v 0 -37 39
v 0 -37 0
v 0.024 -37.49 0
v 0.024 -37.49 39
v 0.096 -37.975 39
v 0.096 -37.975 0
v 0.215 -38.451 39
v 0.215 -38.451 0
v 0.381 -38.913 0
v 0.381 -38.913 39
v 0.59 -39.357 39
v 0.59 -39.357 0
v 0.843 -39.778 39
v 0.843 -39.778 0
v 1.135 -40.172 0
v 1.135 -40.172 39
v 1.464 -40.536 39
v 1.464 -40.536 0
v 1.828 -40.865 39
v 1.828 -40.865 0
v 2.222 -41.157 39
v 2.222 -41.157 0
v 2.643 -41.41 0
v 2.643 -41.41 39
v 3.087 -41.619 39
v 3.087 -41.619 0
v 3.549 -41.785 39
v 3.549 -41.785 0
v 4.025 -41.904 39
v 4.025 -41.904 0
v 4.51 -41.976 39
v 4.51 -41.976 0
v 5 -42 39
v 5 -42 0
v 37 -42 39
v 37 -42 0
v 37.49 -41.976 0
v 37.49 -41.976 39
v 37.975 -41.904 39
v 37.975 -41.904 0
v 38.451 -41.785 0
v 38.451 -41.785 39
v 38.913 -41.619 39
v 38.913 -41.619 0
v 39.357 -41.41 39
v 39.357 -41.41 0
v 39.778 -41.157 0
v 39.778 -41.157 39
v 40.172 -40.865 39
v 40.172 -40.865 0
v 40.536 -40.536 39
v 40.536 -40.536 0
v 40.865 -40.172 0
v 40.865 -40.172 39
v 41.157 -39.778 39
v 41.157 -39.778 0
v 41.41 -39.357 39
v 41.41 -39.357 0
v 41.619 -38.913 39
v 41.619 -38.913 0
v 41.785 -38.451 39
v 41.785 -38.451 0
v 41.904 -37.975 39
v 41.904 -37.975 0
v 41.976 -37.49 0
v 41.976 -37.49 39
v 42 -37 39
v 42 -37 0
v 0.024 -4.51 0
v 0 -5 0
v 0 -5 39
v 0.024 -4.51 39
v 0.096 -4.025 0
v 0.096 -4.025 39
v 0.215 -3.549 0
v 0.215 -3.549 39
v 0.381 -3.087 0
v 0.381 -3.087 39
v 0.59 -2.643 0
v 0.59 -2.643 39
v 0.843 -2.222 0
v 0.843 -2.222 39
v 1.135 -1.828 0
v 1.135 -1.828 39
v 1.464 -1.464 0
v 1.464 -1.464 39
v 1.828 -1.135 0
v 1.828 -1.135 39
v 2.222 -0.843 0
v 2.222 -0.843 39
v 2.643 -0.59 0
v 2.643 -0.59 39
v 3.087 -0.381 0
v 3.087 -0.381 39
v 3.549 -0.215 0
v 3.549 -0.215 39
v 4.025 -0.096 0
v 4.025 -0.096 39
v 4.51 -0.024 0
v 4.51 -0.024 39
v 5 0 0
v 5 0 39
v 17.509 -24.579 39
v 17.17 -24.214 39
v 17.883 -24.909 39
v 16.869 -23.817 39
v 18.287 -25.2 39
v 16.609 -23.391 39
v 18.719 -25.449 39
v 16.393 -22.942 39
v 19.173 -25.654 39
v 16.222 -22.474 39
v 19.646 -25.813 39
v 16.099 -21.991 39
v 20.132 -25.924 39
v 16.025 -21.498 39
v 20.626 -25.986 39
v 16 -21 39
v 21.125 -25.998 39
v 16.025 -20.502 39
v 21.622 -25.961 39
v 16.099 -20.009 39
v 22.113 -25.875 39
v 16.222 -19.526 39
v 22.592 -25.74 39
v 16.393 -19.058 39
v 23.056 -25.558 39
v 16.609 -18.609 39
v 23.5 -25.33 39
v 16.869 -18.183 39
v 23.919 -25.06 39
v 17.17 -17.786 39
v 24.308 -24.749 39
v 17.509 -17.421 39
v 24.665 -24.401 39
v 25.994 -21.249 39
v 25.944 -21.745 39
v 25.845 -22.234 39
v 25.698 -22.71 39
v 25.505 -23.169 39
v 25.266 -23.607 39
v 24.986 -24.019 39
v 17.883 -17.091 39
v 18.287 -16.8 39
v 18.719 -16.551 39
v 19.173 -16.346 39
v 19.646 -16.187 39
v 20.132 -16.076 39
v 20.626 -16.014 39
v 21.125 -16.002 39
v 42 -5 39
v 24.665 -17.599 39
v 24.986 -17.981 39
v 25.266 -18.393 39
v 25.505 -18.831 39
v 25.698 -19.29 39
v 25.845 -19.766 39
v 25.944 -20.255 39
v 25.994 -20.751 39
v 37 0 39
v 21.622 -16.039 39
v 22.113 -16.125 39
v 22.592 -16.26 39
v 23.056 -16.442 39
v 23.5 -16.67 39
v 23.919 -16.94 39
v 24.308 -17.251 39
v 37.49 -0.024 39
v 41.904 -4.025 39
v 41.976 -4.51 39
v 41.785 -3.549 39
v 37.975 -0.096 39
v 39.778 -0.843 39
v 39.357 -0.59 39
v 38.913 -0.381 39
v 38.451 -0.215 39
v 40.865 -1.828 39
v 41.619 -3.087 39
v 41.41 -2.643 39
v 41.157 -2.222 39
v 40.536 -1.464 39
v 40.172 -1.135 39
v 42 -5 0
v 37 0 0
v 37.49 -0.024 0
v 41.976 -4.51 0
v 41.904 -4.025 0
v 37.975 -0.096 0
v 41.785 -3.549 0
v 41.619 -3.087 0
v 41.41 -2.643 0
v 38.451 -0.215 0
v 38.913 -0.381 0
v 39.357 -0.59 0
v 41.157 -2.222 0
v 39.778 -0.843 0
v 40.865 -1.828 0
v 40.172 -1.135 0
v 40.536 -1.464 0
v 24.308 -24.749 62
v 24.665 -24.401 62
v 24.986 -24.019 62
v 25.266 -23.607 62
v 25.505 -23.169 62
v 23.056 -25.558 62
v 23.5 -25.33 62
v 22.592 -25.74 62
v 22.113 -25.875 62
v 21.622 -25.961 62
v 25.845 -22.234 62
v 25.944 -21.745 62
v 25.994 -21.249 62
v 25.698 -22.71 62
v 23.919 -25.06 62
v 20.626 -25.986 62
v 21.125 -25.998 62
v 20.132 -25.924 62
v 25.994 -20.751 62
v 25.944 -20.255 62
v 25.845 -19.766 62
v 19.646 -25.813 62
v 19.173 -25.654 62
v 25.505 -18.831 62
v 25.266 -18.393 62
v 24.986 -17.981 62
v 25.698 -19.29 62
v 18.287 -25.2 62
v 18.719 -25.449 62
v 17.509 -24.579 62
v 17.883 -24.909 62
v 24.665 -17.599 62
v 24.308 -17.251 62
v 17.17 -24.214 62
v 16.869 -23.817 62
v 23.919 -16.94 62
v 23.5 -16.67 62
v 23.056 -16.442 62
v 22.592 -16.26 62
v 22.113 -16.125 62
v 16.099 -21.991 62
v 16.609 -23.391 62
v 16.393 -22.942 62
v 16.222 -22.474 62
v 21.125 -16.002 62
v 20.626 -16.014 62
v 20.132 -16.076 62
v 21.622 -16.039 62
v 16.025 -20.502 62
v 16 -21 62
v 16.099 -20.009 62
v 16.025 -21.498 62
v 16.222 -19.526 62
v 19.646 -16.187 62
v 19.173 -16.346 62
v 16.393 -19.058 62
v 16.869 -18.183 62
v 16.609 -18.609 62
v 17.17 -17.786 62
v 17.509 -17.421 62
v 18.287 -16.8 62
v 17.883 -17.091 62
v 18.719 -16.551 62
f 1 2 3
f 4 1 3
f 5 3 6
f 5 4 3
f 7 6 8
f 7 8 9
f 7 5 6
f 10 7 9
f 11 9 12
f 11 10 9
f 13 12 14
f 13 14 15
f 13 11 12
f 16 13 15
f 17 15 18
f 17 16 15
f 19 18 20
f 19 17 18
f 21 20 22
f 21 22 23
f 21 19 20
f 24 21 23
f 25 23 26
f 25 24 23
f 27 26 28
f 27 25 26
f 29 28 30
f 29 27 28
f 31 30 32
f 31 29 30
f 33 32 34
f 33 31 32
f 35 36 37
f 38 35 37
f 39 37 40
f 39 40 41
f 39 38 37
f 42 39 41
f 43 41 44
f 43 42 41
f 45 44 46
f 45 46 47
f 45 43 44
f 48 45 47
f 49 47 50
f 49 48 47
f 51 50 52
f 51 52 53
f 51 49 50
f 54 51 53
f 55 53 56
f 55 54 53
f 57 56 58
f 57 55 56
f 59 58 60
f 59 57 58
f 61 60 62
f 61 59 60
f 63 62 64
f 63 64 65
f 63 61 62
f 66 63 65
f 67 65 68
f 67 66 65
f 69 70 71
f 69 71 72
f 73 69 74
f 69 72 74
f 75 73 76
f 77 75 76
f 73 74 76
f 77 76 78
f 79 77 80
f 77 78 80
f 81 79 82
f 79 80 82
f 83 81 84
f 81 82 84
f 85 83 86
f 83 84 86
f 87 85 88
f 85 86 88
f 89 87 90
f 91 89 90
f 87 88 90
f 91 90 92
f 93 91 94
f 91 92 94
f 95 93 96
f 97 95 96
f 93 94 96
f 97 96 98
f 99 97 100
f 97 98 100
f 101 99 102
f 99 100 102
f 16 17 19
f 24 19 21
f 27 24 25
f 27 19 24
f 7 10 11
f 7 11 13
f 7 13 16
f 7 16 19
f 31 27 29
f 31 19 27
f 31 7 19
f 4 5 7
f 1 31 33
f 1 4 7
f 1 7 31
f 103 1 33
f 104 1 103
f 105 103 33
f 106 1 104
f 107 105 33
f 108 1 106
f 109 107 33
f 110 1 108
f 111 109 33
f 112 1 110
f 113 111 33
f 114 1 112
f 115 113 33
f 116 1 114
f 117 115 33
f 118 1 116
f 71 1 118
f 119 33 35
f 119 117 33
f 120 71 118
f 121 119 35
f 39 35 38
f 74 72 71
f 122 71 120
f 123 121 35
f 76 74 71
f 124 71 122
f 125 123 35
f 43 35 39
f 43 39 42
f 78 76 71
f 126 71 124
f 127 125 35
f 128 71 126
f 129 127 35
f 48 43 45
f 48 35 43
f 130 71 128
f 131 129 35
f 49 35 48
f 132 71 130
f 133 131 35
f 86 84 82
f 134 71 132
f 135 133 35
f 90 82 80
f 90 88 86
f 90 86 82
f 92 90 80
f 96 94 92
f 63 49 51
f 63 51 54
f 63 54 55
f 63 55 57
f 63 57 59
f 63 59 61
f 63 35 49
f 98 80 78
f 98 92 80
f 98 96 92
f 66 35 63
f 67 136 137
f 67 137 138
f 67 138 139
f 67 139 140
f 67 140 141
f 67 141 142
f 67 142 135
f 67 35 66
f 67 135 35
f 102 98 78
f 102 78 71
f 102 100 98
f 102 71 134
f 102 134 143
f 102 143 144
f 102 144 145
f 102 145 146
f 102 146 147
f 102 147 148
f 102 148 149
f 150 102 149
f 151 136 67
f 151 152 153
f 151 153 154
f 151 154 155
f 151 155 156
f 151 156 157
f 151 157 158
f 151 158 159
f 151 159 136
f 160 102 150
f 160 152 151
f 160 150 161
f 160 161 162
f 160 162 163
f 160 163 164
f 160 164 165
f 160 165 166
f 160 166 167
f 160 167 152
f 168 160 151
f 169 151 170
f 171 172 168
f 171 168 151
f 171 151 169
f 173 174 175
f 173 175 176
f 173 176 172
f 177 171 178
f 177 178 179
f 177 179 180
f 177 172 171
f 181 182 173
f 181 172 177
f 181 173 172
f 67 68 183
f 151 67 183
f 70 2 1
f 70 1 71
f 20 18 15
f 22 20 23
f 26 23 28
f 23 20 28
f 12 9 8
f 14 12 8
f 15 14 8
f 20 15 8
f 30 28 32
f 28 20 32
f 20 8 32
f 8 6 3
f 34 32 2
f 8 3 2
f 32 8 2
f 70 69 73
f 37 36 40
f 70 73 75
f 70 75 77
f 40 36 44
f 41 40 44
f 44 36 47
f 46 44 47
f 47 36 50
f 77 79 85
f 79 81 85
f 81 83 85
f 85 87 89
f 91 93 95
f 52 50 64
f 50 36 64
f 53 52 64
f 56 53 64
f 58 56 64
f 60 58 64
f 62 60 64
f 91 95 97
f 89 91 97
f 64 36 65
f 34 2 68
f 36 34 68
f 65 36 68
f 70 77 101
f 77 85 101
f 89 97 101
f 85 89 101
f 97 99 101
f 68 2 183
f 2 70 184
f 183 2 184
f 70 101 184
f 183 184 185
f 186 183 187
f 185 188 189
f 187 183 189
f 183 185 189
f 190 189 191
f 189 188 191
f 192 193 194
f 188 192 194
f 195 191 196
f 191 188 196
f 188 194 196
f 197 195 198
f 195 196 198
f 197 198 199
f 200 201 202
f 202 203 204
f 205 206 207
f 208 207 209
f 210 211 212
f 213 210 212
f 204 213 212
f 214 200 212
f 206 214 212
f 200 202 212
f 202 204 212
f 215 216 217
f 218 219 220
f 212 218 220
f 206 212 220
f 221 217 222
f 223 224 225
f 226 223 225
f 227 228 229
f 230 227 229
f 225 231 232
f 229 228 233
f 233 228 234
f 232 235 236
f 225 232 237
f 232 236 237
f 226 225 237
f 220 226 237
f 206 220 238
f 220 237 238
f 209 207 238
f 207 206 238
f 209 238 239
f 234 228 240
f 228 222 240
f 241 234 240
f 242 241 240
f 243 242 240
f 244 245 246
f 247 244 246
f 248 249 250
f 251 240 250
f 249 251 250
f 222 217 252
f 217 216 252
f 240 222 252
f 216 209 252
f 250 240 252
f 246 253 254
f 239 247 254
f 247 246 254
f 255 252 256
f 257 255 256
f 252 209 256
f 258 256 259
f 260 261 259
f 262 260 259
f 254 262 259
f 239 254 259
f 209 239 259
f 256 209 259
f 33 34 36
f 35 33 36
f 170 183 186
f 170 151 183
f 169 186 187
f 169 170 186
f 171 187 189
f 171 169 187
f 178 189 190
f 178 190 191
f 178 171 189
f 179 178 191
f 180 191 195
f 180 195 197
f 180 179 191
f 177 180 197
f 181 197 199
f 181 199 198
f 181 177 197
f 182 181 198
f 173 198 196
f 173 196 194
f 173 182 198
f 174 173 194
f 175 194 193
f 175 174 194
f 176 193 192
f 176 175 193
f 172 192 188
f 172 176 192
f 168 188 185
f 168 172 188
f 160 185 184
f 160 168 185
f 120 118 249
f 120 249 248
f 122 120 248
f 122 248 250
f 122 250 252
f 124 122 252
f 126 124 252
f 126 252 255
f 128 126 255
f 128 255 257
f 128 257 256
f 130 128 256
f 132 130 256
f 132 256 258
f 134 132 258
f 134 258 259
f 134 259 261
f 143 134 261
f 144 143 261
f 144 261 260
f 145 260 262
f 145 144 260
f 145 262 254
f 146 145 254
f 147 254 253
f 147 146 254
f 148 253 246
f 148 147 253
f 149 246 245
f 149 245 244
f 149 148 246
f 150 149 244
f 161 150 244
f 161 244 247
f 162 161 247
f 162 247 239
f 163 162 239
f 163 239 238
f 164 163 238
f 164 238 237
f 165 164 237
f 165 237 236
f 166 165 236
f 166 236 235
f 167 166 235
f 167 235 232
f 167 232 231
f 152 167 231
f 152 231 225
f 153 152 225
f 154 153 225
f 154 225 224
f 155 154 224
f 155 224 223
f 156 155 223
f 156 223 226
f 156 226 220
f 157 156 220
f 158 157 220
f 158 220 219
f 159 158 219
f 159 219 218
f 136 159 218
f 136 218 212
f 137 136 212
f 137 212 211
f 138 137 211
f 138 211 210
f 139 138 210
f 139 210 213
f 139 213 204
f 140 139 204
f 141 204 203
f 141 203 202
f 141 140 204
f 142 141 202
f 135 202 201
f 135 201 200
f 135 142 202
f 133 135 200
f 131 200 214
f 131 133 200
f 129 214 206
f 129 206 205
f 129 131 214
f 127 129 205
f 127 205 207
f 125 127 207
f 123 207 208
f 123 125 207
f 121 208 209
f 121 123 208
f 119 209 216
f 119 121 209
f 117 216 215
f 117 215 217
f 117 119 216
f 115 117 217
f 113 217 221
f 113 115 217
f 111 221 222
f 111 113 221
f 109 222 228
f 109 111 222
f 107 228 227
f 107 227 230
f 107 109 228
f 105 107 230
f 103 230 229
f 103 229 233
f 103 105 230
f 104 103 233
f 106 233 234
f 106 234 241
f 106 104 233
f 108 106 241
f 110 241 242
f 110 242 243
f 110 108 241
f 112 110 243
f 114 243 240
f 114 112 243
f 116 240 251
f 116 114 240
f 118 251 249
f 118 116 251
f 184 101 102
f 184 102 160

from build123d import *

# Parameters (mm, degrees)
ESQUISSE1_W             = 42
ESQUISSE1_H             = 42
BOSS_EXTRU_1_DEPTH      = 39
CONG_1_R                = 5
ESQUISSE2_R             = 5
BOSS_EXTRU_2_DEPTH      = 23
ESQUISSE3_R             = 5
BOSS_EXTRU_3_DEPTH      = 85
ESQUISSE4_R             = 5
ENL_V_MAT_EXTRU_1_DEPTH = 23


with BuildPart() as part:
    # Esquisse1 → Boss.-Extru.1 (new body)
    with BuildSketch(Plane.XY):
        with Locations((21, -21)):
            Rectangle(ESQUISSE1_W, ESQUISSE1_H)
    extrude(amount=BOSS_EXTRU_1_DEPTH)

    # Congé1
    cong_1_edges = [part.edges().sort_by_distance(p)[0] for p in [
        (0, 0, 19.5),
        (42, 0, 19.5),
        (42, -42, 19.5),
        (0, -42, 19.5),
    ]]
    fillet(cong_1_edges, radius=CONG_1_R)

    # Esquisse2 → Boss.-Extru.2 (add)
    with BuildSketch(Plane(origin=(0, 0, 0), x_dir=(-1, 0, 0), z_dir=(0, 0, -1))):
        with Locations((-21, -21)):
            Circle(ESQUISSE2_R)
    extrude(amount=BOSS_EXTRU_2_DEPTH)

    # Esquisse3 → Boss.-Extru.3 (add)
    with BuildSketch(Plane(origin=(0, 0, -23), x_dir=(-1, 0, 0), z_dir=(0, 0, -1))):
        with Locations((-21, -21)):
            Circle(ESQUISSE3_R)
    extrude(amount=-BOSS_EXTRU_3_DEPTH)

    # Esquisse4 → Enlèv. mat.-Extru.1 (cut)
    with BuildSketch(Plane(origin=(0, 0, -23), x_dir=(-1, 0, 0), z_dir=(0, 0, -1))):
        with Locations((-21, -21)):
            Circle(ESQUISSE4_R)
    extrude(amount=-ENL_V_MAT_EXTRU_1_DEPTH, mode=Mode.SUBTRACT)


solid = part.part
